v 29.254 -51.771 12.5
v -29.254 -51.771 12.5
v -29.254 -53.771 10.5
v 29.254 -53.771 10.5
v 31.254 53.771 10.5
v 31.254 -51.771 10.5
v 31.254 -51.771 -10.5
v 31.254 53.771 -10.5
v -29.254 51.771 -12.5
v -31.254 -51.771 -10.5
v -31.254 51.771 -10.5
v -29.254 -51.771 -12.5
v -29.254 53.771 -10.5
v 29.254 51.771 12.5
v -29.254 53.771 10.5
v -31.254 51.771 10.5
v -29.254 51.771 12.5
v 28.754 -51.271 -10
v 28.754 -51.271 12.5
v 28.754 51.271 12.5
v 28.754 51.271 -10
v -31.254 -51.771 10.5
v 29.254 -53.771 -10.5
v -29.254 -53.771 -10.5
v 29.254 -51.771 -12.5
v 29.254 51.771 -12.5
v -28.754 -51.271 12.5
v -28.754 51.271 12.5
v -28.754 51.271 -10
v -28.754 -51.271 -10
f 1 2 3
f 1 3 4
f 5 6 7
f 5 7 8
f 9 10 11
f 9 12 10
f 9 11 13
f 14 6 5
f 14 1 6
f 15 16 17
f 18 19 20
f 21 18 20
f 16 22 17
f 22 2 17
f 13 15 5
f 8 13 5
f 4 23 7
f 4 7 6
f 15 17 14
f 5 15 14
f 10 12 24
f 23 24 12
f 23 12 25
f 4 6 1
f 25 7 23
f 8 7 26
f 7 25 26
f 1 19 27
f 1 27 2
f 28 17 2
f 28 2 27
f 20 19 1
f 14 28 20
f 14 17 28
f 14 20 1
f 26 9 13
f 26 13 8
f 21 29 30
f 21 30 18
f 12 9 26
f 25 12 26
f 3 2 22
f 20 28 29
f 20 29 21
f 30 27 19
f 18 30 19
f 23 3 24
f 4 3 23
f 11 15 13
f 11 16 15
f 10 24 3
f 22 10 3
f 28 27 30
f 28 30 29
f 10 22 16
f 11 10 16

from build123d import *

# Parameters (mm, degrees)
F0_W     = 62.507808
F0_H     = 107.542976
F1_DEPTH = 12.5
F2_T     = -2.5
F3_SIZE  = 2


with BuildPart() as f1:
    # F0 (on Top) → F1 (new body, symmetric)
    with BuildSketch(Plane.XY):
        Rectangle(F0_W, F0_H)
    extrude(amount=F1_DEPTH, both=True)

    # F2
    f2_openings = [f1.faces().sort_by_distance(p)[0] for p in [
        (0, 0, 12.5),
    ]]
    offset(amount=F2_T, openings=f2_openings)

    # F3
    f3_edges = [f1.edges().sort_by_distance(p)[0] for p in [
        (-31.253904, 53.771488, 0),
        (-31.253904, 0, -12.5),
        (-31.253904, 0, 12.5),
        (0, 53.771488, -12.5),
        (0, 53.771488, 12.5),
        (31.253904, 0, 12.5),
        (31.253904, 0, -12.5),
        (31.253904, -53.771488, 0),
        (0, -53.771488, -12.5),
        (0, -53.771488, 12.5),
        (-31.253904, -53.771488, 0),
    ]]
    chamfer(f3_edges, length=F3_SIZE)


solid = f1.part
